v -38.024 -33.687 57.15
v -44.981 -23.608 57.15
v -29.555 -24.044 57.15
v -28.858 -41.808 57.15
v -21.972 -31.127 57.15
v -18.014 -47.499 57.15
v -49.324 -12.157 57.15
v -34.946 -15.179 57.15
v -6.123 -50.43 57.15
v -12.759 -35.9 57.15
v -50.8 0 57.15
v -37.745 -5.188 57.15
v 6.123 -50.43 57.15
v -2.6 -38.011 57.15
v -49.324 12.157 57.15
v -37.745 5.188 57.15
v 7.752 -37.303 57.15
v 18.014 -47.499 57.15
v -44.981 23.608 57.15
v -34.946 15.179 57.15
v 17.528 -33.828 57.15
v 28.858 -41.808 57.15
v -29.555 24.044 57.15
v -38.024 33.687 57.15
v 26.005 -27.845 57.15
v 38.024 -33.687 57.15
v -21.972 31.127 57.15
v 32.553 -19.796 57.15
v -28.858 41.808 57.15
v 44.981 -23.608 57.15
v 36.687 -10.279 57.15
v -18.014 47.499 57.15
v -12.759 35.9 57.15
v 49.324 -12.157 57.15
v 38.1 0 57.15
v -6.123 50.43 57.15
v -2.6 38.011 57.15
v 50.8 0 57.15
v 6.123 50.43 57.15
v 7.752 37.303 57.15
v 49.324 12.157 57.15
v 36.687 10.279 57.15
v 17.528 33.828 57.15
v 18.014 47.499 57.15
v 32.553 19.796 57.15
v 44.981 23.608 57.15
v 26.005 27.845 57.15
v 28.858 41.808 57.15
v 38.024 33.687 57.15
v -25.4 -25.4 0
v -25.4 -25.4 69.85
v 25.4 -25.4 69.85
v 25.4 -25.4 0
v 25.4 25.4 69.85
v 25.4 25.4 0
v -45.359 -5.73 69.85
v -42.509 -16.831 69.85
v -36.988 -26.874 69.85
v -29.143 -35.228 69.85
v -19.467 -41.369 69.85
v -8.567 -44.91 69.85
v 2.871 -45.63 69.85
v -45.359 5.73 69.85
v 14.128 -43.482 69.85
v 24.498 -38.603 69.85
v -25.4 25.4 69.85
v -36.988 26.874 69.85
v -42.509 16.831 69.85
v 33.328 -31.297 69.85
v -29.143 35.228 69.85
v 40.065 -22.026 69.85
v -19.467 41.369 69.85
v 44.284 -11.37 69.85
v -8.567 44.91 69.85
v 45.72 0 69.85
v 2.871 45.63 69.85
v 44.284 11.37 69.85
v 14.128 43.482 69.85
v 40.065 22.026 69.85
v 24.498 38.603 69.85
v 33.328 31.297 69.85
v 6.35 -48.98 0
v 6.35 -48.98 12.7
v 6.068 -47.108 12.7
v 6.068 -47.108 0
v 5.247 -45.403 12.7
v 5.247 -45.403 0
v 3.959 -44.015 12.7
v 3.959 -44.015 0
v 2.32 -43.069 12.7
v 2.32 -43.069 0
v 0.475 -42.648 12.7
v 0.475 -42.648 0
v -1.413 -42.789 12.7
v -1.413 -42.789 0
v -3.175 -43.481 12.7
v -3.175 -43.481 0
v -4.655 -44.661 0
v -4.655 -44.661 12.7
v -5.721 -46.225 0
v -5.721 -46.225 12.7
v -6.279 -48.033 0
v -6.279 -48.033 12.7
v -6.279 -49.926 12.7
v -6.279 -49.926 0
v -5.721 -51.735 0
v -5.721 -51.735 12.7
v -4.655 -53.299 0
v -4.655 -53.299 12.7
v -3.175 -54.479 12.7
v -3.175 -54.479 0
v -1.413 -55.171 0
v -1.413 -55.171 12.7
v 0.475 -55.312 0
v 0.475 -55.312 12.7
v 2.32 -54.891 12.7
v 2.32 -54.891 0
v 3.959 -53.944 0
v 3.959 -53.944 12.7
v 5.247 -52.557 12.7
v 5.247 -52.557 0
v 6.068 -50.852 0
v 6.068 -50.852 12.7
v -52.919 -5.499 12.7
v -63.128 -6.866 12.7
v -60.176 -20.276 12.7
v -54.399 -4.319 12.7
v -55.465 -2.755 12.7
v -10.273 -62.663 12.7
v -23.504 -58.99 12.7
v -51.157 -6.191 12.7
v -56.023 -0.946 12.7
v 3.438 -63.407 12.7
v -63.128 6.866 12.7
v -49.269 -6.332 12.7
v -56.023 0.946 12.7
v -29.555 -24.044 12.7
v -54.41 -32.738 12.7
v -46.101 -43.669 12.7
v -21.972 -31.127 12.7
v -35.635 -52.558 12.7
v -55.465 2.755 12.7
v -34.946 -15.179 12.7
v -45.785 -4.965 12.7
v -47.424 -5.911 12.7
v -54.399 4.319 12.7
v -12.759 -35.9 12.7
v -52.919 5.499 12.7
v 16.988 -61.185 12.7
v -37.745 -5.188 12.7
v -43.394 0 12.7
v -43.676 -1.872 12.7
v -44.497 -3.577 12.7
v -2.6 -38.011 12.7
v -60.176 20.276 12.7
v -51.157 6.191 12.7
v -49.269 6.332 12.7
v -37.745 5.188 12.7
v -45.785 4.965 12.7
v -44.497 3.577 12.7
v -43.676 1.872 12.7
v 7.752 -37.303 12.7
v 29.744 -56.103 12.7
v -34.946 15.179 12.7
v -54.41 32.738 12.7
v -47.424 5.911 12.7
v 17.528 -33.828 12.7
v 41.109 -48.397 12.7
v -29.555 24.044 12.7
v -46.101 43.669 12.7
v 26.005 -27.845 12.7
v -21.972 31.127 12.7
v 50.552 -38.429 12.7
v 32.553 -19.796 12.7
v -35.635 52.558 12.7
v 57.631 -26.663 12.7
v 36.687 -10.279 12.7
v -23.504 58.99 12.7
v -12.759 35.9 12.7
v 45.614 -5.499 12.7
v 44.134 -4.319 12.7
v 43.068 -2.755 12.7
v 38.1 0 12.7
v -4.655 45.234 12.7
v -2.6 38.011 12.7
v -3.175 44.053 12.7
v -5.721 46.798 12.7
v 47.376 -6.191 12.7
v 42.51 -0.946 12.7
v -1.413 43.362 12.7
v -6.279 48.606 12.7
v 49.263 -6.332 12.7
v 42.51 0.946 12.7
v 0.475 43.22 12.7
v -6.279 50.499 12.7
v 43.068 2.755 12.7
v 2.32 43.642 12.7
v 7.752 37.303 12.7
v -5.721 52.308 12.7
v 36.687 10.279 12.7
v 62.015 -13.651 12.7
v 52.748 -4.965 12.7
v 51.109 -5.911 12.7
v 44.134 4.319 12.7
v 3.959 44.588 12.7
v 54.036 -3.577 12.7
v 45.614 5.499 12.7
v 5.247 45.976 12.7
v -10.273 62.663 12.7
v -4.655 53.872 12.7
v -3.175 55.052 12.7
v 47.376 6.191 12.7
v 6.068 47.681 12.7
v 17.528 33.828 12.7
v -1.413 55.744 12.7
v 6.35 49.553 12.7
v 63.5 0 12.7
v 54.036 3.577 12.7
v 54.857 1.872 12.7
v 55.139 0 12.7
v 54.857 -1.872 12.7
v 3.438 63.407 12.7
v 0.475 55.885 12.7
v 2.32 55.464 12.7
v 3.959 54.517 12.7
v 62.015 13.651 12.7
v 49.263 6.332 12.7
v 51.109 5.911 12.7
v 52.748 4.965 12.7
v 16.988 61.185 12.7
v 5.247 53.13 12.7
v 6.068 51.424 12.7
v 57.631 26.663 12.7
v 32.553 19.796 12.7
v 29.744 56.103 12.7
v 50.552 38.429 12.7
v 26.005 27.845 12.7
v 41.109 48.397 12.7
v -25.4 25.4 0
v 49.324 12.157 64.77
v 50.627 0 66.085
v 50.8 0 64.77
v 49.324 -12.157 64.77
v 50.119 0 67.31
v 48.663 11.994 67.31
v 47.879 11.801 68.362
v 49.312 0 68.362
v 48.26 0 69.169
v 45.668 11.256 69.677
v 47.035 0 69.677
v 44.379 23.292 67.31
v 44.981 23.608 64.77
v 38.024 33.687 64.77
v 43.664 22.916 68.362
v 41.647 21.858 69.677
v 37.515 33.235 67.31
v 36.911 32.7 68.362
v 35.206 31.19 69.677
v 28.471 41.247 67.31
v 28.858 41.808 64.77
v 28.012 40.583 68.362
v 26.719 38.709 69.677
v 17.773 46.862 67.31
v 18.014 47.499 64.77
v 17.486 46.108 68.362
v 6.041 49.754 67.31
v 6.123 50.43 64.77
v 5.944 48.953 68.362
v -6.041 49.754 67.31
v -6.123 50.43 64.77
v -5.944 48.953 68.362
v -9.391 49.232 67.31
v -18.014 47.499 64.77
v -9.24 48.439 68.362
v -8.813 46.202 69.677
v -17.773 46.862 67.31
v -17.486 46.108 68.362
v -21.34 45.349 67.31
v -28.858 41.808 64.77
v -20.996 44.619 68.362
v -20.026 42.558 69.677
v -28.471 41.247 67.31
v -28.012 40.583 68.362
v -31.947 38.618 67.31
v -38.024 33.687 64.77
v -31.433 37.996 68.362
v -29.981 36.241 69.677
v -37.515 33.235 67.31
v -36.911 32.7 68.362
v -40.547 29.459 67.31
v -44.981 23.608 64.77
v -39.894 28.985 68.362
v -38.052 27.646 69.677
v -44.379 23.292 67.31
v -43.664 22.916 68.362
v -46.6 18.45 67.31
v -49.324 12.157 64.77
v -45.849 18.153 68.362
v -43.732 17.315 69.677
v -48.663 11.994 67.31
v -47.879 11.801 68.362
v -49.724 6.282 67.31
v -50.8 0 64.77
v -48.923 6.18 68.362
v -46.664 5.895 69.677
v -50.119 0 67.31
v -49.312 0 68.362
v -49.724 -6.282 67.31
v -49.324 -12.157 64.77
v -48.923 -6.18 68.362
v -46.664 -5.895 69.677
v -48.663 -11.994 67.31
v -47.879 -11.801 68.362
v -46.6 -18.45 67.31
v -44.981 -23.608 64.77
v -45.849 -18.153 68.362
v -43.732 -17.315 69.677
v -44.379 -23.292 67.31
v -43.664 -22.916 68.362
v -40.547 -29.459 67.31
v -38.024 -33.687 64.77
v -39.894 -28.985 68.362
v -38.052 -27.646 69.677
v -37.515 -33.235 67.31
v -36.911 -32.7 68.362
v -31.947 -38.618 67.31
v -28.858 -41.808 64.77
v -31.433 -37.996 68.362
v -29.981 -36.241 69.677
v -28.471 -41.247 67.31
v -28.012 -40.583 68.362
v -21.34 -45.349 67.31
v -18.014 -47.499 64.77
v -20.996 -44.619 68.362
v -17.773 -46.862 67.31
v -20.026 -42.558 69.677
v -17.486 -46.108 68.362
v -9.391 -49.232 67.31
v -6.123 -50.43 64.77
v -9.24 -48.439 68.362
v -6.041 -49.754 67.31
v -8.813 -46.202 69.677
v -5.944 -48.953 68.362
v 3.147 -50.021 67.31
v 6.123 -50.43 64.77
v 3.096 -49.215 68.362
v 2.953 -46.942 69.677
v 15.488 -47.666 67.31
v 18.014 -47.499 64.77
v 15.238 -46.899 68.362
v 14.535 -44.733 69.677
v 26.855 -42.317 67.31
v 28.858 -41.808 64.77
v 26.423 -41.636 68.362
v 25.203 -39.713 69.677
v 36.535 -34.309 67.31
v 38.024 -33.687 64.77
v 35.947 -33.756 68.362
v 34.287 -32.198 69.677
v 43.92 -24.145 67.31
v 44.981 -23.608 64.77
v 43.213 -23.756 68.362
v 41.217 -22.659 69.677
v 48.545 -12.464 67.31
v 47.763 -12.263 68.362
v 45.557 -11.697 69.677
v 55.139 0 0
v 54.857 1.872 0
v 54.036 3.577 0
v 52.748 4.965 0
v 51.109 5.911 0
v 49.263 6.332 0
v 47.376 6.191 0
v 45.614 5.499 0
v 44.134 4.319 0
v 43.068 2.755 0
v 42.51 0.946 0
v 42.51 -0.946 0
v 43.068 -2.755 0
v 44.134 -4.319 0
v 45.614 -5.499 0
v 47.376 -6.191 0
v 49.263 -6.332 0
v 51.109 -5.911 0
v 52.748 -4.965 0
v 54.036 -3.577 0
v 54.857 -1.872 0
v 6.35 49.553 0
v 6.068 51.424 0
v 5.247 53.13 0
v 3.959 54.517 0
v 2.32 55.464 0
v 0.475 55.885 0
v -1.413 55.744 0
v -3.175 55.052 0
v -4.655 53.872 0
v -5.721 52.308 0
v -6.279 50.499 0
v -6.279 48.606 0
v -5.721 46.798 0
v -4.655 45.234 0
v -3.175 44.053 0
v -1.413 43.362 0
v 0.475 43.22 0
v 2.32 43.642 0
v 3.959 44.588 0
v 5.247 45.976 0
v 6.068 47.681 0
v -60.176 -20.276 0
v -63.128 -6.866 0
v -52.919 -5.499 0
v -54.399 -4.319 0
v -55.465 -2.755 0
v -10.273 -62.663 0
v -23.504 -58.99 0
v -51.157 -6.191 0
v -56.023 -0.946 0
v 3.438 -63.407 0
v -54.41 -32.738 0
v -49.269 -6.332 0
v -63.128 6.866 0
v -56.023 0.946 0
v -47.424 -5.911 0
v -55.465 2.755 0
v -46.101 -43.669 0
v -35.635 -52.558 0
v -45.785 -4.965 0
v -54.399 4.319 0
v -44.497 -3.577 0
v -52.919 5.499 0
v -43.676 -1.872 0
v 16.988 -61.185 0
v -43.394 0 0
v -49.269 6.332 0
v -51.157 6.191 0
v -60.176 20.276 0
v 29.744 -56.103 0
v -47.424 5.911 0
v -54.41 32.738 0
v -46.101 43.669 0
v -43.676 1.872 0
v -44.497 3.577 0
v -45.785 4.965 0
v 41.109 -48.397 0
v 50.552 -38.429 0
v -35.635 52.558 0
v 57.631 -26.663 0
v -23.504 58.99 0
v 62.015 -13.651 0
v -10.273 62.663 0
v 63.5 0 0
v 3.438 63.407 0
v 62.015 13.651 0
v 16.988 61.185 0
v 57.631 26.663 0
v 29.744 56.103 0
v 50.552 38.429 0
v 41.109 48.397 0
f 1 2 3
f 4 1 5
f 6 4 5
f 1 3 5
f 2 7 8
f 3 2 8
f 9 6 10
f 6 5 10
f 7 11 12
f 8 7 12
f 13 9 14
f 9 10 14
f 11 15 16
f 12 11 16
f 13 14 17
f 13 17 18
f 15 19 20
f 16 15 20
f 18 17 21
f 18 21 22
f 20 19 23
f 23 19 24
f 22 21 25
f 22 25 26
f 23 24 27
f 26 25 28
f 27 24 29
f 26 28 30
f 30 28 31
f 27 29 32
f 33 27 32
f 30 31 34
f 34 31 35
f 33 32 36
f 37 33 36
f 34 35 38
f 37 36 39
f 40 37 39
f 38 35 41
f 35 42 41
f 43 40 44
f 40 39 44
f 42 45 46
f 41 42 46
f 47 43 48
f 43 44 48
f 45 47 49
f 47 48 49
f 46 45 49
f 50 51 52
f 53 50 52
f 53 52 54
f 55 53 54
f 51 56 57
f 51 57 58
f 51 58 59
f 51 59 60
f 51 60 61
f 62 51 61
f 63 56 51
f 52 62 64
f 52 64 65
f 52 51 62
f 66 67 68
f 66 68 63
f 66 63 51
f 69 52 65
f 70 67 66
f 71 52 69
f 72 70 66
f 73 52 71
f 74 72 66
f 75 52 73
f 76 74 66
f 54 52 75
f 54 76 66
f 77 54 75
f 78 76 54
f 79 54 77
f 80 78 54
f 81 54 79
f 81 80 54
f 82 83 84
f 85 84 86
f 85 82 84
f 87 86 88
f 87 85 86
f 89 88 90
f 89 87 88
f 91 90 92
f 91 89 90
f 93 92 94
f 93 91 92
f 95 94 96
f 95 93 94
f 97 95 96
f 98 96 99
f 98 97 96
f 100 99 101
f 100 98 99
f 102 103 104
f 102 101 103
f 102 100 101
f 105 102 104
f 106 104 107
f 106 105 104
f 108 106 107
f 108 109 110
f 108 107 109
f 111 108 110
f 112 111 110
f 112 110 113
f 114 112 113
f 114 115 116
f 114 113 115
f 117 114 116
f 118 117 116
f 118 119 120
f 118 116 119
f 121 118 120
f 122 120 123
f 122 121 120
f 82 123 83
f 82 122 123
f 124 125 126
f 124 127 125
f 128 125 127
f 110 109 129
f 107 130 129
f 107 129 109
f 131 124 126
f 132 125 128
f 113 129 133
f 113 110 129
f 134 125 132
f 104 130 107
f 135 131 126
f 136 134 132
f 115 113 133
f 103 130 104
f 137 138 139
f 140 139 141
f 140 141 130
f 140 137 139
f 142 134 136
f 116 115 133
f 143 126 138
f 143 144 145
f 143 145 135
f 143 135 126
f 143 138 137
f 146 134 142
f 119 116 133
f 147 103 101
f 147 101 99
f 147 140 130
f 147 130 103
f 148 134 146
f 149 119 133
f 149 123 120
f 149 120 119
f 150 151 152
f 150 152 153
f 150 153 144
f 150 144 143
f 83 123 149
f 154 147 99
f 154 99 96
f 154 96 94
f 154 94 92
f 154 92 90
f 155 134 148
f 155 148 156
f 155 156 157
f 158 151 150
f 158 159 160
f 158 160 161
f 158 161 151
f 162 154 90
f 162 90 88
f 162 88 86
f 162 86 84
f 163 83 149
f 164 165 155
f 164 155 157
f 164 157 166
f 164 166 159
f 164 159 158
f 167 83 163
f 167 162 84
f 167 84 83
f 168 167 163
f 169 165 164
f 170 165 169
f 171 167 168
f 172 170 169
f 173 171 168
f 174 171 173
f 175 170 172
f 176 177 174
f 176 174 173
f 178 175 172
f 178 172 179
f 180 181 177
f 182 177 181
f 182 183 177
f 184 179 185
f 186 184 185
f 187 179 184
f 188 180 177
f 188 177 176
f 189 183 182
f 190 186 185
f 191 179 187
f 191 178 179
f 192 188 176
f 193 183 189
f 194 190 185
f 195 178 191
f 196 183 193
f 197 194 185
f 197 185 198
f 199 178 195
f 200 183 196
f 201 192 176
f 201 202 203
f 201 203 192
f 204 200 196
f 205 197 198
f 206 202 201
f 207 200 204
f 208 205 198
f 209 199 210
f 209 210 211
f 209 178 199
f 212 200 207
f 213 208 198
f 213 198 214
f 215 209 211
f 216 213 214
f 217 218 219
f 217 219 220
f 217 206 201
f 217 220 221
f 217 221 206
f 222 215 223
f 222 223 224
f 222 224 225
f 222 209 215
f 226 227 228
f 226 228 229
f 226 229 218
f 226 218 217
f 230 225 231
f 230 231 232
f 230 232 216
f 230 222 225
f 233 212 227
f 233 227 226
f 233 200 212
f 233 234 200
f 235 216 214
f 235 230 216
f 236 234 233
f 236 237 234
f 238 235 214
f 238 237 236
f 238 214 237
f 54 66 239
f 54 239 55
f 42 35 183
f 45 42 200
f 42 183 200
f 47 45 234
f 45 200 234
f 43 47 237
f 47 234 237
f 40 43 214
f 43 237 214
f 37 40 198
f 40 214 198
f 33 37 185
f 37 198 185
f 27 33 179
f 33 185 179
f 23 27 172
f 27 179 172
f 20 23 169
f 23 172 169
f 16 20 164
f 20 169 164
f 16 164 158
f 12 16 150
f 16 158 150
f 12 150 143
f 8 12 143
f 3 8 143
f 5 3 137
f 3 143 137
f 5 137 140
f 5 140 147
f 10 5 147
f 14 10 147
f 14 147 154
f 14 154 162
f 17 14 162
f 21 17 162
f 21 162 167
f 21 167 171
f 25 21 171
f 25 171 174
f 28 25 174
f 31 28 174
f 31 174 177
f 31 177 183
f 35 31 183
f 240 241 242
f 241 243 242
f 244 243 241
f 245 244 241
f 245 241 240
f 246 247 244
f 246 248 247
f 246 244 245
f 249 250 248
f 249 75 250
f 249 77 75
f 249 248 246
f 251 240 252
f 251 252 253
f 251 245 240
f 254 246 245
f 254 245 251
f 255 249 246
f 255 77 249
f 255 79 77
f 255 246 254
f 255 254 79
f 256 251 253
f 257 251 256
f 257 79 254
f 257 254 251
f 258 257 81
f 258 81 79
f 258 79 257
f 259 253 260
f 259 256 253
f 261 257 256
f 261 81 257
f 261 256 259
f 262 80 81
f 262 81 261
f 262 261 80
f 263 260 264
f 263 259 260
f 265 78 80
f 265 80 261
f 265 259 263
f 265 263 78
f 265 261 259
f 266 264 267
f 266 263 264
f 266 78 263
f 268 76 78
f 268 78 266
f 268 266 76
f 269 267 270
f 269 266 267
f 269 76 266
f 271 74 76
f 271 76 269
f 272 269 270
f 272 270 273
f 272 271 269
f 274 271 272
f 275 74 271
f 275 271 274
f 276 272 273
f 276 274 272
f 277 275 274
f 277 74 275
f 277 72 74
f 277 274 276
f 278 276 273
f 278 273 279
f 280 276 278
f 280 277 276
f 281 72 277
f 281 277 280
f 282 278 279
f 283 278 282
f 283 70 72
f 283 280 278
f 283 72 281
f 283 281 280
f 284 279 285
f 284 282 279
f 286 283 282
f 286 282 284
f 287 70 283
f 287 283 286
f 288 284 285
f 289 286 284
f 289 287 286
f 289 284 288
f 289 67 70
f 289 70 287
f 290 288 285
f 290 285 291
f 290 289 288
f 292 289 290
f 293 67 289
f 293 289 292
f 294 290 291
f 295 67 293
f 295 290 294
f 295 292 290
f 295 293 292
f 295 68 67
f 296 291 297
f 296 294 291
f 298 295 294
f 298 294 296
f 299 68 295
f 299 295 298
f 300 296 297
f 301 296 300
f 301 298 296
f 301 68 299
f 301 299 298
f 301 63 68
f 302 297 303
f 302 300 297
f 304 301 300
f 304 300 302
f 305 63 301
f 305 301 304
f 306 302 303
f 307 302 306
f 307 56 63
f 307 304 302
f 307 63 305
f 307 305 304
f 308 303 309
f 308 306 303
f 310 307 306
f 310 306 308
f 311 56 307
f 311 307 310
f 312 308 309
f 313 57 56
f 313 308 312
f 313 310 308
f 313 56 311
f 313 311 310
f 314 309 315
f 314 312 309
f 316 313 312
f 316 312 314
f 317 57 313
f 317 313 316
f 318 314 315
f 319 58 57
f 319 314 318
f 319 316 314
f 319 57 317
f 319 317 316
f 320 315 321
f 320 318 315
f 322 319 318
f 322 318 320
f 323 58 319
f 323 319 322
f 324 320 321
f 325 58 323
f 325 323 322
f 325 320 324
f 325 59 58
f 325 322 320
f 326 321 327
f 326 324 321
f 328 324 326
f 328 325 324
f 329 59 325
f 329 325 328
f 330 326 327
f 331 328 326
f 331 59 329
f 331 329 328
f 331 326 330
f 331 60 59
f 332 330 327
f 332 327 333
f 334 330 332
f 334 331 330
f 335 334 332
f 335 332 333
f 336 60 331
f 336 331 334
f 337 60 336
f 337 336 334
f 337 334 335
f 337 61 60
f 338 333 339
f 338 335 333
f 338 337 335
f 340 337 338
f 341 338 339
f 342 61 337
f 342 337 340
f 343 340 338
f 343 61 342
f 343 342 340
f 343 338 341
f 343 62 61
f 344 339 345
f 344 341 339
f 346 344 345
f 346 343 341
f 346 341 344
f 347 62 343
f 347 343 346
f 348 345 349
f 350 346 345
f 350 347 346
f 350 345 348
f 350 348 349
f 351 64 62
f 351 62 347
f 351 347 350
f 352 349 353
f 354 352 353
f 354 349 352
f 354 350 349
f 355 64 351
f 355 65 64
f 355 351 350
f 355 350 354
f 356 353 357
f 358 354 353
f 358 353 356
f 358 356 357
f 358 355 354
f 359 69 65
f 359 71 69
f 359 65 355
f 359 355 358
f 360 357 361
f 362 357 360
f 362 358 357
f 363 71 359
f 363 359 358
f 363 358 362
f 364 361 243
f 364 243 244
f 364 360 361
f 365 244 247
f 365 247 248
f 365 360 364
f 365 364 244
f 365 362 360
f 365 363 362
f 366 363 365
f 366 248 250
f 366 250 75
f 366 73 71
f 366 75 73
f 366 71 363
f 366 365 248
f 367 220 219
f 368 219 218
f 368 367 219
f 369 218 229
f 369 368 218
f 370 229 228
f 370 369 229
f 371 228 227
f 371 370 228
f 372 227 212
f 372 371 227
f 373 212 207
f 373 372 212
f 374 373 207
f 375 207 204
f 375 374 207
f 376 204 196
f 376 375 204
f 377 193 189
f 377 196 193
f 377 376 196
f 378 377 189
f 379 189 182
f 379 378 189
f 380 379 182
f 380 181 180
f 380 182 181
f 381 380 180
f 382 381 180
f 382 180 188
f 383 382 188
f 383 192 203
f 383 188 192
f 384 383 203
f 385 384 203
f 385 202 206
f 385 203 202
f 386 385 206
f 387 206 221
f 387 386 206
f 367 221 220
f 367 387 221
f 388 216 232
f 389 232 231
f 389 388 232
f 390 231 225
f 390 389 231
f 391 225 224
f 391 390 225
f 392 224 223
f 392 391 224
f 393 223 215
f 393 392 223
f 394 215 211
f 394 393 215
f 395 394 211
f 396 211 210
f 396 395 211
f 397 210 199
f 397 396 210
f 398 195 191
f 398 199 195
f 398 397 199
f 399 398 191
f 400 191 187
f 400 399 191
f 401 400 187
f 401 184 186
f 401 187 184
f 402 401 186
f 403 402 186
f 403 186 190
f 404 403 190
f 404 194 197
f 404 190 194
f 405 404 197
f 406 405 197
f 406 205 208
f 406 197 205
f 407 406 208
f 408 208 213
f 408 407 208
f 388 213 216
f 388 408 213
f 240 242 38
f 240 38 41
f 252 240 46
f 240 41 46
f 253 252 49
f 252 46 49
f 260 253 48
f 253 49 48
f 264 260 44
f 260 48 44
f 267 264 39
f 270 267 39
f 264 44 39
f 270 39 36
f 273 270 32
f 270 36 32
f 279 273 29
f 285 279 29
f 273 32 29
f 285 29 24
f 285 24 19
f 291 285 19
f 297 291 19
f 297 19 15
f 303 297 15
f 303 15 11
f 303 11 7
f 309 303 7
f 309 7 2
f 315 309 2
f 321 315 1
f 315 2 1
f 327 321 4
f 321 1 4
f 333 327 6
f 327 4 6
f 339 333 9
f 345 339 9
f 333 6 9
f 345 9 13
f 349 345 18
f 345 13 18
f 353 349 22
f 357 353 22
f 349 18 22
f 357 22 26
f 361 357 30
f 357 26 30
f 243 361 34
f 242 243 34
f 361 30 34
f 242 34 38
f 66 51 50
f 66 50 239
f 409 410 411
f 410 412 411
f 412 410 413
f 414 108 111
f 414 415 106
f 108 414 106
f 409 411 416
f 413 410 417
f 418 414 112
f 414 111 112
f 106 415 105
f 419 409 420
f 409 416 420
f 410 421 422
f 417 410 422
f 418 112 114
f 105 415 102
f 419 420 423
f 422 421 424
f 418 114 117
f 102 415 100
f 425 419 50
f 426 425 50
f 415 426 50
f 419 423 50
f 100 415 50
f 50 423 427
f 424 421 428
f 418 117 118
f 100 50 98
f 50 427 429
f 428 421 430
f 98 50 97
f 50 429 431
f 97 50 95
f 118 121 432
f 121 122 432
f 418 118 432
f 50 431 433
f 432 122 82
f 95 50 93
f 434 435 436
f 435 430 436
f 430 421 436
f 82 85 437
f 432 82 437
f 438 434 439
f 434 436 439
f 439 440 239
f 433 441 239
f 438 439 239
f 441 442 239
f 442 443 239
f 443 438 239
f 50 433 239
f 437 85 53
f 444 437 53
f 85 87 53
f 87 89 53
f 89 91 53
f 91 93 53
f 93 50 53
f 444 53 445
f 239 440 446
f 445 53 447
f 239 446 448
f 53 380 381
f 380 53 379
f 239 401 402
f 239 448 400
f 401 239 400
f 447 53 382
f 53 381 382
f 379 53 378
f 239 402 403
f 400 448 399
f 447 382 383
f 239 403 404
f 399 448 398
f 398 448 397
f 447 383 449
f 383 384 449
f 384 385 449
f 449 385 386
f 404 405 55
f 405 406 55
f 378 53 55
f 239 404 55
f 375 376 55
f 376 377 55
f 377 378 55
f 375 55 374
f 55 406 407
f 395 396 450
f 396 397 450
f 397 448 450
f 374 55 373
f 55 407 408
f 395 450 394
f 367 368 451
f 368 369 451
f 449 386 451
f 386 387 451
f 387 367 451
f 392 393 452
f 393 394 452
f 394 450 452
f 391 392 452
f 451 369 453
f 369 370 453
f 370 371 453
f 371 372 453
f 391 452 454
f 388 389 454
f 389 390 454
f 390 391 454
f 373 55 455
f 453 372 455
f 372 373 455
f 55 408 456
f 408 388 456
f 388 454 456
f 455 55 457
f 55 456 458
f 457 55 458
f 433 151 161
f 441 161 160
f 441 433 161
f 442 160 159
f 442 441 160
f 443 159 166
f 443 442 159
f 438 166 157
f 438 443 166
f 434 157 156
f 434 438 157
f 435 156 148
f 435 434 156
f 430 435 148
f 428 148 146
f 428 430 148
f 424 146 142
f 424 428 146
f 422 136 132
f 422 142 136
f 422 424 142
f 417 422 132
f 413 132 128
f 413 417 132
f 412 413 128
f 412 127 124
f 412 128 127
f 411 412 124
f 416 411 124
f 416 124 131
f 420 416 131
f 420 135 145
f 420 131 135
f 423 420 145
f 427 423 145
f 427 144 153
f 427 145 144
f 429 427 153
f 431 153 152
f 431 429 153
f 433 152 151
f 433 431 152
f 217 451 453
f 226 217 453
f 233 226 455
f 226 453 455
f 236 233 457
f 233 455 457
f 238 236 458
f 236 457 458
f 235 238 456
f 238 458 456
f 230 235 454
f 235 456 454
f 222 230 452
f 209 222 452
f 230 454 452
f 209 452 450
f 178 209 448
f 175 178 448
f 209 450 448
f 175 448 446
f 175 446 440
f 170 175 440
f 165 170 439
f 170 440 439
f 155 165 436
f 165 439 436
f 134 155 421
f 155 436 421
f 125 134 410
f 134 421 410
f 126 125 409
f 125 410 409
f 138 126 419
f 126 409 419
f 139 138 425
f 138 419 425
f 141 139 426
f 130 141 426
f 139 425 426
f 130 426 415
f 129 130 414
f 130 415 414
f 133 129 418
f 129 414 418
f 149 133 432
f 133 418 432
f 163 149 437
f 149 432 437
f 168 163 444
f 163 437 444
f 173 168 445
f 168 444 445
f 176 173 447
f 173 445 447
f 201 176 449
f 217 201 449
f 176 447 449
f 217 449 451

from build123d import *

# Parameters (mm, degrees)
F0_R      = 63.5
F1_DEPTH  = 12.7
F2_R      = 38.1
F3_DEPTH  = 57.15
F4_R      = 6.35
F5_DEPTH  = 12.7
F6_DEPTH  = 25.4
F7_DEPTH  = 25.4
F8_R      = 50.8
F9_DEPTH  = 12.7
F10_W     = 50.8
F10_H     = 50.8
F11_DEPTH = 127
F12_R     = 5.08


with BuildPart() as f1:
    # F0 (on Top) → F1 (new body)
    with BuildSketch(Plane.XY):
        Circle(F0_R)
    extrude(amount=F1_DEPTH)

    # F2 (on Top) → F3 (join)
    with BuildSketch(Plane.XY):
        Circle(F2_R)
    extrude(amount=F3_DEPTH)

    # F4 (on Top) → F5 (cut)
    with BuildSketch(Plane.XY):
        with Locations((-49.74369, 0)):
            Circle(F4_R)
        with Locations((0, 49.552731)):
            Circle(F4_R)
        with Locations((48.788916, 0)):
            Circle(F4_R)
        with Locations((0, -48.979867)):
            Circle(F4_R)
    extrude(amount=-F5_DEPTH, mode=Mode.SUBTRACT)

    # F4 (on Top) → F6 (cut)
    with BuildSketch(Plane.XY):
        with Locations((-49.74369, 0)):
            Circle(F4_R)
        with Locations((0, 49.552731)):
            Circle(F4_R)
        with Locations((48.788916, 0)):
            Circle(F4_R)
        with Locations((0, -48.979867)):
            Circle(F4_R)
    extrude(amount=F6_DEPTH, mode=Mode.SUBTRACT)

    # F4 (on Top) → F7 (cut)
    with BuildSketch(Plane.XY):
        with Locations((-49.74369, 0)):
            Circle(F4_R)
        with Locations((0, 49.552731)):
            Circle(F4_R)
        with Locations((48.788916, 0)):
            Circle(F4_R)
        with Locations((0, -48.979867)):
            Circle(F4_R)
    extrude(amount=-F7_DEPTH, mode=Mode.SUBTRACT)

    # F8 (on face) → F9 (join)
    with BuildSketch(Plane.XY.offset(57.15)):
        Circle(F8_R)
    extrude(amount=F9_DEPTH)

    # F10 (on face) → F11 (cut)
    with BuildSketch(Plane.XY.offset(69.85)):
        Rectangle(F10_W, F10_H)
    extrude(amount=-F11_DEPTH, mode=Mode.SUBTRACT)

    # F12
    f12_edges = [f1.edges().sort_by_distance(p)[0] for p in [
        (-50.8, 0, 69.85),
    ]]
    fillet(f12_edges, radius=F12_R)


solid = f1.part
